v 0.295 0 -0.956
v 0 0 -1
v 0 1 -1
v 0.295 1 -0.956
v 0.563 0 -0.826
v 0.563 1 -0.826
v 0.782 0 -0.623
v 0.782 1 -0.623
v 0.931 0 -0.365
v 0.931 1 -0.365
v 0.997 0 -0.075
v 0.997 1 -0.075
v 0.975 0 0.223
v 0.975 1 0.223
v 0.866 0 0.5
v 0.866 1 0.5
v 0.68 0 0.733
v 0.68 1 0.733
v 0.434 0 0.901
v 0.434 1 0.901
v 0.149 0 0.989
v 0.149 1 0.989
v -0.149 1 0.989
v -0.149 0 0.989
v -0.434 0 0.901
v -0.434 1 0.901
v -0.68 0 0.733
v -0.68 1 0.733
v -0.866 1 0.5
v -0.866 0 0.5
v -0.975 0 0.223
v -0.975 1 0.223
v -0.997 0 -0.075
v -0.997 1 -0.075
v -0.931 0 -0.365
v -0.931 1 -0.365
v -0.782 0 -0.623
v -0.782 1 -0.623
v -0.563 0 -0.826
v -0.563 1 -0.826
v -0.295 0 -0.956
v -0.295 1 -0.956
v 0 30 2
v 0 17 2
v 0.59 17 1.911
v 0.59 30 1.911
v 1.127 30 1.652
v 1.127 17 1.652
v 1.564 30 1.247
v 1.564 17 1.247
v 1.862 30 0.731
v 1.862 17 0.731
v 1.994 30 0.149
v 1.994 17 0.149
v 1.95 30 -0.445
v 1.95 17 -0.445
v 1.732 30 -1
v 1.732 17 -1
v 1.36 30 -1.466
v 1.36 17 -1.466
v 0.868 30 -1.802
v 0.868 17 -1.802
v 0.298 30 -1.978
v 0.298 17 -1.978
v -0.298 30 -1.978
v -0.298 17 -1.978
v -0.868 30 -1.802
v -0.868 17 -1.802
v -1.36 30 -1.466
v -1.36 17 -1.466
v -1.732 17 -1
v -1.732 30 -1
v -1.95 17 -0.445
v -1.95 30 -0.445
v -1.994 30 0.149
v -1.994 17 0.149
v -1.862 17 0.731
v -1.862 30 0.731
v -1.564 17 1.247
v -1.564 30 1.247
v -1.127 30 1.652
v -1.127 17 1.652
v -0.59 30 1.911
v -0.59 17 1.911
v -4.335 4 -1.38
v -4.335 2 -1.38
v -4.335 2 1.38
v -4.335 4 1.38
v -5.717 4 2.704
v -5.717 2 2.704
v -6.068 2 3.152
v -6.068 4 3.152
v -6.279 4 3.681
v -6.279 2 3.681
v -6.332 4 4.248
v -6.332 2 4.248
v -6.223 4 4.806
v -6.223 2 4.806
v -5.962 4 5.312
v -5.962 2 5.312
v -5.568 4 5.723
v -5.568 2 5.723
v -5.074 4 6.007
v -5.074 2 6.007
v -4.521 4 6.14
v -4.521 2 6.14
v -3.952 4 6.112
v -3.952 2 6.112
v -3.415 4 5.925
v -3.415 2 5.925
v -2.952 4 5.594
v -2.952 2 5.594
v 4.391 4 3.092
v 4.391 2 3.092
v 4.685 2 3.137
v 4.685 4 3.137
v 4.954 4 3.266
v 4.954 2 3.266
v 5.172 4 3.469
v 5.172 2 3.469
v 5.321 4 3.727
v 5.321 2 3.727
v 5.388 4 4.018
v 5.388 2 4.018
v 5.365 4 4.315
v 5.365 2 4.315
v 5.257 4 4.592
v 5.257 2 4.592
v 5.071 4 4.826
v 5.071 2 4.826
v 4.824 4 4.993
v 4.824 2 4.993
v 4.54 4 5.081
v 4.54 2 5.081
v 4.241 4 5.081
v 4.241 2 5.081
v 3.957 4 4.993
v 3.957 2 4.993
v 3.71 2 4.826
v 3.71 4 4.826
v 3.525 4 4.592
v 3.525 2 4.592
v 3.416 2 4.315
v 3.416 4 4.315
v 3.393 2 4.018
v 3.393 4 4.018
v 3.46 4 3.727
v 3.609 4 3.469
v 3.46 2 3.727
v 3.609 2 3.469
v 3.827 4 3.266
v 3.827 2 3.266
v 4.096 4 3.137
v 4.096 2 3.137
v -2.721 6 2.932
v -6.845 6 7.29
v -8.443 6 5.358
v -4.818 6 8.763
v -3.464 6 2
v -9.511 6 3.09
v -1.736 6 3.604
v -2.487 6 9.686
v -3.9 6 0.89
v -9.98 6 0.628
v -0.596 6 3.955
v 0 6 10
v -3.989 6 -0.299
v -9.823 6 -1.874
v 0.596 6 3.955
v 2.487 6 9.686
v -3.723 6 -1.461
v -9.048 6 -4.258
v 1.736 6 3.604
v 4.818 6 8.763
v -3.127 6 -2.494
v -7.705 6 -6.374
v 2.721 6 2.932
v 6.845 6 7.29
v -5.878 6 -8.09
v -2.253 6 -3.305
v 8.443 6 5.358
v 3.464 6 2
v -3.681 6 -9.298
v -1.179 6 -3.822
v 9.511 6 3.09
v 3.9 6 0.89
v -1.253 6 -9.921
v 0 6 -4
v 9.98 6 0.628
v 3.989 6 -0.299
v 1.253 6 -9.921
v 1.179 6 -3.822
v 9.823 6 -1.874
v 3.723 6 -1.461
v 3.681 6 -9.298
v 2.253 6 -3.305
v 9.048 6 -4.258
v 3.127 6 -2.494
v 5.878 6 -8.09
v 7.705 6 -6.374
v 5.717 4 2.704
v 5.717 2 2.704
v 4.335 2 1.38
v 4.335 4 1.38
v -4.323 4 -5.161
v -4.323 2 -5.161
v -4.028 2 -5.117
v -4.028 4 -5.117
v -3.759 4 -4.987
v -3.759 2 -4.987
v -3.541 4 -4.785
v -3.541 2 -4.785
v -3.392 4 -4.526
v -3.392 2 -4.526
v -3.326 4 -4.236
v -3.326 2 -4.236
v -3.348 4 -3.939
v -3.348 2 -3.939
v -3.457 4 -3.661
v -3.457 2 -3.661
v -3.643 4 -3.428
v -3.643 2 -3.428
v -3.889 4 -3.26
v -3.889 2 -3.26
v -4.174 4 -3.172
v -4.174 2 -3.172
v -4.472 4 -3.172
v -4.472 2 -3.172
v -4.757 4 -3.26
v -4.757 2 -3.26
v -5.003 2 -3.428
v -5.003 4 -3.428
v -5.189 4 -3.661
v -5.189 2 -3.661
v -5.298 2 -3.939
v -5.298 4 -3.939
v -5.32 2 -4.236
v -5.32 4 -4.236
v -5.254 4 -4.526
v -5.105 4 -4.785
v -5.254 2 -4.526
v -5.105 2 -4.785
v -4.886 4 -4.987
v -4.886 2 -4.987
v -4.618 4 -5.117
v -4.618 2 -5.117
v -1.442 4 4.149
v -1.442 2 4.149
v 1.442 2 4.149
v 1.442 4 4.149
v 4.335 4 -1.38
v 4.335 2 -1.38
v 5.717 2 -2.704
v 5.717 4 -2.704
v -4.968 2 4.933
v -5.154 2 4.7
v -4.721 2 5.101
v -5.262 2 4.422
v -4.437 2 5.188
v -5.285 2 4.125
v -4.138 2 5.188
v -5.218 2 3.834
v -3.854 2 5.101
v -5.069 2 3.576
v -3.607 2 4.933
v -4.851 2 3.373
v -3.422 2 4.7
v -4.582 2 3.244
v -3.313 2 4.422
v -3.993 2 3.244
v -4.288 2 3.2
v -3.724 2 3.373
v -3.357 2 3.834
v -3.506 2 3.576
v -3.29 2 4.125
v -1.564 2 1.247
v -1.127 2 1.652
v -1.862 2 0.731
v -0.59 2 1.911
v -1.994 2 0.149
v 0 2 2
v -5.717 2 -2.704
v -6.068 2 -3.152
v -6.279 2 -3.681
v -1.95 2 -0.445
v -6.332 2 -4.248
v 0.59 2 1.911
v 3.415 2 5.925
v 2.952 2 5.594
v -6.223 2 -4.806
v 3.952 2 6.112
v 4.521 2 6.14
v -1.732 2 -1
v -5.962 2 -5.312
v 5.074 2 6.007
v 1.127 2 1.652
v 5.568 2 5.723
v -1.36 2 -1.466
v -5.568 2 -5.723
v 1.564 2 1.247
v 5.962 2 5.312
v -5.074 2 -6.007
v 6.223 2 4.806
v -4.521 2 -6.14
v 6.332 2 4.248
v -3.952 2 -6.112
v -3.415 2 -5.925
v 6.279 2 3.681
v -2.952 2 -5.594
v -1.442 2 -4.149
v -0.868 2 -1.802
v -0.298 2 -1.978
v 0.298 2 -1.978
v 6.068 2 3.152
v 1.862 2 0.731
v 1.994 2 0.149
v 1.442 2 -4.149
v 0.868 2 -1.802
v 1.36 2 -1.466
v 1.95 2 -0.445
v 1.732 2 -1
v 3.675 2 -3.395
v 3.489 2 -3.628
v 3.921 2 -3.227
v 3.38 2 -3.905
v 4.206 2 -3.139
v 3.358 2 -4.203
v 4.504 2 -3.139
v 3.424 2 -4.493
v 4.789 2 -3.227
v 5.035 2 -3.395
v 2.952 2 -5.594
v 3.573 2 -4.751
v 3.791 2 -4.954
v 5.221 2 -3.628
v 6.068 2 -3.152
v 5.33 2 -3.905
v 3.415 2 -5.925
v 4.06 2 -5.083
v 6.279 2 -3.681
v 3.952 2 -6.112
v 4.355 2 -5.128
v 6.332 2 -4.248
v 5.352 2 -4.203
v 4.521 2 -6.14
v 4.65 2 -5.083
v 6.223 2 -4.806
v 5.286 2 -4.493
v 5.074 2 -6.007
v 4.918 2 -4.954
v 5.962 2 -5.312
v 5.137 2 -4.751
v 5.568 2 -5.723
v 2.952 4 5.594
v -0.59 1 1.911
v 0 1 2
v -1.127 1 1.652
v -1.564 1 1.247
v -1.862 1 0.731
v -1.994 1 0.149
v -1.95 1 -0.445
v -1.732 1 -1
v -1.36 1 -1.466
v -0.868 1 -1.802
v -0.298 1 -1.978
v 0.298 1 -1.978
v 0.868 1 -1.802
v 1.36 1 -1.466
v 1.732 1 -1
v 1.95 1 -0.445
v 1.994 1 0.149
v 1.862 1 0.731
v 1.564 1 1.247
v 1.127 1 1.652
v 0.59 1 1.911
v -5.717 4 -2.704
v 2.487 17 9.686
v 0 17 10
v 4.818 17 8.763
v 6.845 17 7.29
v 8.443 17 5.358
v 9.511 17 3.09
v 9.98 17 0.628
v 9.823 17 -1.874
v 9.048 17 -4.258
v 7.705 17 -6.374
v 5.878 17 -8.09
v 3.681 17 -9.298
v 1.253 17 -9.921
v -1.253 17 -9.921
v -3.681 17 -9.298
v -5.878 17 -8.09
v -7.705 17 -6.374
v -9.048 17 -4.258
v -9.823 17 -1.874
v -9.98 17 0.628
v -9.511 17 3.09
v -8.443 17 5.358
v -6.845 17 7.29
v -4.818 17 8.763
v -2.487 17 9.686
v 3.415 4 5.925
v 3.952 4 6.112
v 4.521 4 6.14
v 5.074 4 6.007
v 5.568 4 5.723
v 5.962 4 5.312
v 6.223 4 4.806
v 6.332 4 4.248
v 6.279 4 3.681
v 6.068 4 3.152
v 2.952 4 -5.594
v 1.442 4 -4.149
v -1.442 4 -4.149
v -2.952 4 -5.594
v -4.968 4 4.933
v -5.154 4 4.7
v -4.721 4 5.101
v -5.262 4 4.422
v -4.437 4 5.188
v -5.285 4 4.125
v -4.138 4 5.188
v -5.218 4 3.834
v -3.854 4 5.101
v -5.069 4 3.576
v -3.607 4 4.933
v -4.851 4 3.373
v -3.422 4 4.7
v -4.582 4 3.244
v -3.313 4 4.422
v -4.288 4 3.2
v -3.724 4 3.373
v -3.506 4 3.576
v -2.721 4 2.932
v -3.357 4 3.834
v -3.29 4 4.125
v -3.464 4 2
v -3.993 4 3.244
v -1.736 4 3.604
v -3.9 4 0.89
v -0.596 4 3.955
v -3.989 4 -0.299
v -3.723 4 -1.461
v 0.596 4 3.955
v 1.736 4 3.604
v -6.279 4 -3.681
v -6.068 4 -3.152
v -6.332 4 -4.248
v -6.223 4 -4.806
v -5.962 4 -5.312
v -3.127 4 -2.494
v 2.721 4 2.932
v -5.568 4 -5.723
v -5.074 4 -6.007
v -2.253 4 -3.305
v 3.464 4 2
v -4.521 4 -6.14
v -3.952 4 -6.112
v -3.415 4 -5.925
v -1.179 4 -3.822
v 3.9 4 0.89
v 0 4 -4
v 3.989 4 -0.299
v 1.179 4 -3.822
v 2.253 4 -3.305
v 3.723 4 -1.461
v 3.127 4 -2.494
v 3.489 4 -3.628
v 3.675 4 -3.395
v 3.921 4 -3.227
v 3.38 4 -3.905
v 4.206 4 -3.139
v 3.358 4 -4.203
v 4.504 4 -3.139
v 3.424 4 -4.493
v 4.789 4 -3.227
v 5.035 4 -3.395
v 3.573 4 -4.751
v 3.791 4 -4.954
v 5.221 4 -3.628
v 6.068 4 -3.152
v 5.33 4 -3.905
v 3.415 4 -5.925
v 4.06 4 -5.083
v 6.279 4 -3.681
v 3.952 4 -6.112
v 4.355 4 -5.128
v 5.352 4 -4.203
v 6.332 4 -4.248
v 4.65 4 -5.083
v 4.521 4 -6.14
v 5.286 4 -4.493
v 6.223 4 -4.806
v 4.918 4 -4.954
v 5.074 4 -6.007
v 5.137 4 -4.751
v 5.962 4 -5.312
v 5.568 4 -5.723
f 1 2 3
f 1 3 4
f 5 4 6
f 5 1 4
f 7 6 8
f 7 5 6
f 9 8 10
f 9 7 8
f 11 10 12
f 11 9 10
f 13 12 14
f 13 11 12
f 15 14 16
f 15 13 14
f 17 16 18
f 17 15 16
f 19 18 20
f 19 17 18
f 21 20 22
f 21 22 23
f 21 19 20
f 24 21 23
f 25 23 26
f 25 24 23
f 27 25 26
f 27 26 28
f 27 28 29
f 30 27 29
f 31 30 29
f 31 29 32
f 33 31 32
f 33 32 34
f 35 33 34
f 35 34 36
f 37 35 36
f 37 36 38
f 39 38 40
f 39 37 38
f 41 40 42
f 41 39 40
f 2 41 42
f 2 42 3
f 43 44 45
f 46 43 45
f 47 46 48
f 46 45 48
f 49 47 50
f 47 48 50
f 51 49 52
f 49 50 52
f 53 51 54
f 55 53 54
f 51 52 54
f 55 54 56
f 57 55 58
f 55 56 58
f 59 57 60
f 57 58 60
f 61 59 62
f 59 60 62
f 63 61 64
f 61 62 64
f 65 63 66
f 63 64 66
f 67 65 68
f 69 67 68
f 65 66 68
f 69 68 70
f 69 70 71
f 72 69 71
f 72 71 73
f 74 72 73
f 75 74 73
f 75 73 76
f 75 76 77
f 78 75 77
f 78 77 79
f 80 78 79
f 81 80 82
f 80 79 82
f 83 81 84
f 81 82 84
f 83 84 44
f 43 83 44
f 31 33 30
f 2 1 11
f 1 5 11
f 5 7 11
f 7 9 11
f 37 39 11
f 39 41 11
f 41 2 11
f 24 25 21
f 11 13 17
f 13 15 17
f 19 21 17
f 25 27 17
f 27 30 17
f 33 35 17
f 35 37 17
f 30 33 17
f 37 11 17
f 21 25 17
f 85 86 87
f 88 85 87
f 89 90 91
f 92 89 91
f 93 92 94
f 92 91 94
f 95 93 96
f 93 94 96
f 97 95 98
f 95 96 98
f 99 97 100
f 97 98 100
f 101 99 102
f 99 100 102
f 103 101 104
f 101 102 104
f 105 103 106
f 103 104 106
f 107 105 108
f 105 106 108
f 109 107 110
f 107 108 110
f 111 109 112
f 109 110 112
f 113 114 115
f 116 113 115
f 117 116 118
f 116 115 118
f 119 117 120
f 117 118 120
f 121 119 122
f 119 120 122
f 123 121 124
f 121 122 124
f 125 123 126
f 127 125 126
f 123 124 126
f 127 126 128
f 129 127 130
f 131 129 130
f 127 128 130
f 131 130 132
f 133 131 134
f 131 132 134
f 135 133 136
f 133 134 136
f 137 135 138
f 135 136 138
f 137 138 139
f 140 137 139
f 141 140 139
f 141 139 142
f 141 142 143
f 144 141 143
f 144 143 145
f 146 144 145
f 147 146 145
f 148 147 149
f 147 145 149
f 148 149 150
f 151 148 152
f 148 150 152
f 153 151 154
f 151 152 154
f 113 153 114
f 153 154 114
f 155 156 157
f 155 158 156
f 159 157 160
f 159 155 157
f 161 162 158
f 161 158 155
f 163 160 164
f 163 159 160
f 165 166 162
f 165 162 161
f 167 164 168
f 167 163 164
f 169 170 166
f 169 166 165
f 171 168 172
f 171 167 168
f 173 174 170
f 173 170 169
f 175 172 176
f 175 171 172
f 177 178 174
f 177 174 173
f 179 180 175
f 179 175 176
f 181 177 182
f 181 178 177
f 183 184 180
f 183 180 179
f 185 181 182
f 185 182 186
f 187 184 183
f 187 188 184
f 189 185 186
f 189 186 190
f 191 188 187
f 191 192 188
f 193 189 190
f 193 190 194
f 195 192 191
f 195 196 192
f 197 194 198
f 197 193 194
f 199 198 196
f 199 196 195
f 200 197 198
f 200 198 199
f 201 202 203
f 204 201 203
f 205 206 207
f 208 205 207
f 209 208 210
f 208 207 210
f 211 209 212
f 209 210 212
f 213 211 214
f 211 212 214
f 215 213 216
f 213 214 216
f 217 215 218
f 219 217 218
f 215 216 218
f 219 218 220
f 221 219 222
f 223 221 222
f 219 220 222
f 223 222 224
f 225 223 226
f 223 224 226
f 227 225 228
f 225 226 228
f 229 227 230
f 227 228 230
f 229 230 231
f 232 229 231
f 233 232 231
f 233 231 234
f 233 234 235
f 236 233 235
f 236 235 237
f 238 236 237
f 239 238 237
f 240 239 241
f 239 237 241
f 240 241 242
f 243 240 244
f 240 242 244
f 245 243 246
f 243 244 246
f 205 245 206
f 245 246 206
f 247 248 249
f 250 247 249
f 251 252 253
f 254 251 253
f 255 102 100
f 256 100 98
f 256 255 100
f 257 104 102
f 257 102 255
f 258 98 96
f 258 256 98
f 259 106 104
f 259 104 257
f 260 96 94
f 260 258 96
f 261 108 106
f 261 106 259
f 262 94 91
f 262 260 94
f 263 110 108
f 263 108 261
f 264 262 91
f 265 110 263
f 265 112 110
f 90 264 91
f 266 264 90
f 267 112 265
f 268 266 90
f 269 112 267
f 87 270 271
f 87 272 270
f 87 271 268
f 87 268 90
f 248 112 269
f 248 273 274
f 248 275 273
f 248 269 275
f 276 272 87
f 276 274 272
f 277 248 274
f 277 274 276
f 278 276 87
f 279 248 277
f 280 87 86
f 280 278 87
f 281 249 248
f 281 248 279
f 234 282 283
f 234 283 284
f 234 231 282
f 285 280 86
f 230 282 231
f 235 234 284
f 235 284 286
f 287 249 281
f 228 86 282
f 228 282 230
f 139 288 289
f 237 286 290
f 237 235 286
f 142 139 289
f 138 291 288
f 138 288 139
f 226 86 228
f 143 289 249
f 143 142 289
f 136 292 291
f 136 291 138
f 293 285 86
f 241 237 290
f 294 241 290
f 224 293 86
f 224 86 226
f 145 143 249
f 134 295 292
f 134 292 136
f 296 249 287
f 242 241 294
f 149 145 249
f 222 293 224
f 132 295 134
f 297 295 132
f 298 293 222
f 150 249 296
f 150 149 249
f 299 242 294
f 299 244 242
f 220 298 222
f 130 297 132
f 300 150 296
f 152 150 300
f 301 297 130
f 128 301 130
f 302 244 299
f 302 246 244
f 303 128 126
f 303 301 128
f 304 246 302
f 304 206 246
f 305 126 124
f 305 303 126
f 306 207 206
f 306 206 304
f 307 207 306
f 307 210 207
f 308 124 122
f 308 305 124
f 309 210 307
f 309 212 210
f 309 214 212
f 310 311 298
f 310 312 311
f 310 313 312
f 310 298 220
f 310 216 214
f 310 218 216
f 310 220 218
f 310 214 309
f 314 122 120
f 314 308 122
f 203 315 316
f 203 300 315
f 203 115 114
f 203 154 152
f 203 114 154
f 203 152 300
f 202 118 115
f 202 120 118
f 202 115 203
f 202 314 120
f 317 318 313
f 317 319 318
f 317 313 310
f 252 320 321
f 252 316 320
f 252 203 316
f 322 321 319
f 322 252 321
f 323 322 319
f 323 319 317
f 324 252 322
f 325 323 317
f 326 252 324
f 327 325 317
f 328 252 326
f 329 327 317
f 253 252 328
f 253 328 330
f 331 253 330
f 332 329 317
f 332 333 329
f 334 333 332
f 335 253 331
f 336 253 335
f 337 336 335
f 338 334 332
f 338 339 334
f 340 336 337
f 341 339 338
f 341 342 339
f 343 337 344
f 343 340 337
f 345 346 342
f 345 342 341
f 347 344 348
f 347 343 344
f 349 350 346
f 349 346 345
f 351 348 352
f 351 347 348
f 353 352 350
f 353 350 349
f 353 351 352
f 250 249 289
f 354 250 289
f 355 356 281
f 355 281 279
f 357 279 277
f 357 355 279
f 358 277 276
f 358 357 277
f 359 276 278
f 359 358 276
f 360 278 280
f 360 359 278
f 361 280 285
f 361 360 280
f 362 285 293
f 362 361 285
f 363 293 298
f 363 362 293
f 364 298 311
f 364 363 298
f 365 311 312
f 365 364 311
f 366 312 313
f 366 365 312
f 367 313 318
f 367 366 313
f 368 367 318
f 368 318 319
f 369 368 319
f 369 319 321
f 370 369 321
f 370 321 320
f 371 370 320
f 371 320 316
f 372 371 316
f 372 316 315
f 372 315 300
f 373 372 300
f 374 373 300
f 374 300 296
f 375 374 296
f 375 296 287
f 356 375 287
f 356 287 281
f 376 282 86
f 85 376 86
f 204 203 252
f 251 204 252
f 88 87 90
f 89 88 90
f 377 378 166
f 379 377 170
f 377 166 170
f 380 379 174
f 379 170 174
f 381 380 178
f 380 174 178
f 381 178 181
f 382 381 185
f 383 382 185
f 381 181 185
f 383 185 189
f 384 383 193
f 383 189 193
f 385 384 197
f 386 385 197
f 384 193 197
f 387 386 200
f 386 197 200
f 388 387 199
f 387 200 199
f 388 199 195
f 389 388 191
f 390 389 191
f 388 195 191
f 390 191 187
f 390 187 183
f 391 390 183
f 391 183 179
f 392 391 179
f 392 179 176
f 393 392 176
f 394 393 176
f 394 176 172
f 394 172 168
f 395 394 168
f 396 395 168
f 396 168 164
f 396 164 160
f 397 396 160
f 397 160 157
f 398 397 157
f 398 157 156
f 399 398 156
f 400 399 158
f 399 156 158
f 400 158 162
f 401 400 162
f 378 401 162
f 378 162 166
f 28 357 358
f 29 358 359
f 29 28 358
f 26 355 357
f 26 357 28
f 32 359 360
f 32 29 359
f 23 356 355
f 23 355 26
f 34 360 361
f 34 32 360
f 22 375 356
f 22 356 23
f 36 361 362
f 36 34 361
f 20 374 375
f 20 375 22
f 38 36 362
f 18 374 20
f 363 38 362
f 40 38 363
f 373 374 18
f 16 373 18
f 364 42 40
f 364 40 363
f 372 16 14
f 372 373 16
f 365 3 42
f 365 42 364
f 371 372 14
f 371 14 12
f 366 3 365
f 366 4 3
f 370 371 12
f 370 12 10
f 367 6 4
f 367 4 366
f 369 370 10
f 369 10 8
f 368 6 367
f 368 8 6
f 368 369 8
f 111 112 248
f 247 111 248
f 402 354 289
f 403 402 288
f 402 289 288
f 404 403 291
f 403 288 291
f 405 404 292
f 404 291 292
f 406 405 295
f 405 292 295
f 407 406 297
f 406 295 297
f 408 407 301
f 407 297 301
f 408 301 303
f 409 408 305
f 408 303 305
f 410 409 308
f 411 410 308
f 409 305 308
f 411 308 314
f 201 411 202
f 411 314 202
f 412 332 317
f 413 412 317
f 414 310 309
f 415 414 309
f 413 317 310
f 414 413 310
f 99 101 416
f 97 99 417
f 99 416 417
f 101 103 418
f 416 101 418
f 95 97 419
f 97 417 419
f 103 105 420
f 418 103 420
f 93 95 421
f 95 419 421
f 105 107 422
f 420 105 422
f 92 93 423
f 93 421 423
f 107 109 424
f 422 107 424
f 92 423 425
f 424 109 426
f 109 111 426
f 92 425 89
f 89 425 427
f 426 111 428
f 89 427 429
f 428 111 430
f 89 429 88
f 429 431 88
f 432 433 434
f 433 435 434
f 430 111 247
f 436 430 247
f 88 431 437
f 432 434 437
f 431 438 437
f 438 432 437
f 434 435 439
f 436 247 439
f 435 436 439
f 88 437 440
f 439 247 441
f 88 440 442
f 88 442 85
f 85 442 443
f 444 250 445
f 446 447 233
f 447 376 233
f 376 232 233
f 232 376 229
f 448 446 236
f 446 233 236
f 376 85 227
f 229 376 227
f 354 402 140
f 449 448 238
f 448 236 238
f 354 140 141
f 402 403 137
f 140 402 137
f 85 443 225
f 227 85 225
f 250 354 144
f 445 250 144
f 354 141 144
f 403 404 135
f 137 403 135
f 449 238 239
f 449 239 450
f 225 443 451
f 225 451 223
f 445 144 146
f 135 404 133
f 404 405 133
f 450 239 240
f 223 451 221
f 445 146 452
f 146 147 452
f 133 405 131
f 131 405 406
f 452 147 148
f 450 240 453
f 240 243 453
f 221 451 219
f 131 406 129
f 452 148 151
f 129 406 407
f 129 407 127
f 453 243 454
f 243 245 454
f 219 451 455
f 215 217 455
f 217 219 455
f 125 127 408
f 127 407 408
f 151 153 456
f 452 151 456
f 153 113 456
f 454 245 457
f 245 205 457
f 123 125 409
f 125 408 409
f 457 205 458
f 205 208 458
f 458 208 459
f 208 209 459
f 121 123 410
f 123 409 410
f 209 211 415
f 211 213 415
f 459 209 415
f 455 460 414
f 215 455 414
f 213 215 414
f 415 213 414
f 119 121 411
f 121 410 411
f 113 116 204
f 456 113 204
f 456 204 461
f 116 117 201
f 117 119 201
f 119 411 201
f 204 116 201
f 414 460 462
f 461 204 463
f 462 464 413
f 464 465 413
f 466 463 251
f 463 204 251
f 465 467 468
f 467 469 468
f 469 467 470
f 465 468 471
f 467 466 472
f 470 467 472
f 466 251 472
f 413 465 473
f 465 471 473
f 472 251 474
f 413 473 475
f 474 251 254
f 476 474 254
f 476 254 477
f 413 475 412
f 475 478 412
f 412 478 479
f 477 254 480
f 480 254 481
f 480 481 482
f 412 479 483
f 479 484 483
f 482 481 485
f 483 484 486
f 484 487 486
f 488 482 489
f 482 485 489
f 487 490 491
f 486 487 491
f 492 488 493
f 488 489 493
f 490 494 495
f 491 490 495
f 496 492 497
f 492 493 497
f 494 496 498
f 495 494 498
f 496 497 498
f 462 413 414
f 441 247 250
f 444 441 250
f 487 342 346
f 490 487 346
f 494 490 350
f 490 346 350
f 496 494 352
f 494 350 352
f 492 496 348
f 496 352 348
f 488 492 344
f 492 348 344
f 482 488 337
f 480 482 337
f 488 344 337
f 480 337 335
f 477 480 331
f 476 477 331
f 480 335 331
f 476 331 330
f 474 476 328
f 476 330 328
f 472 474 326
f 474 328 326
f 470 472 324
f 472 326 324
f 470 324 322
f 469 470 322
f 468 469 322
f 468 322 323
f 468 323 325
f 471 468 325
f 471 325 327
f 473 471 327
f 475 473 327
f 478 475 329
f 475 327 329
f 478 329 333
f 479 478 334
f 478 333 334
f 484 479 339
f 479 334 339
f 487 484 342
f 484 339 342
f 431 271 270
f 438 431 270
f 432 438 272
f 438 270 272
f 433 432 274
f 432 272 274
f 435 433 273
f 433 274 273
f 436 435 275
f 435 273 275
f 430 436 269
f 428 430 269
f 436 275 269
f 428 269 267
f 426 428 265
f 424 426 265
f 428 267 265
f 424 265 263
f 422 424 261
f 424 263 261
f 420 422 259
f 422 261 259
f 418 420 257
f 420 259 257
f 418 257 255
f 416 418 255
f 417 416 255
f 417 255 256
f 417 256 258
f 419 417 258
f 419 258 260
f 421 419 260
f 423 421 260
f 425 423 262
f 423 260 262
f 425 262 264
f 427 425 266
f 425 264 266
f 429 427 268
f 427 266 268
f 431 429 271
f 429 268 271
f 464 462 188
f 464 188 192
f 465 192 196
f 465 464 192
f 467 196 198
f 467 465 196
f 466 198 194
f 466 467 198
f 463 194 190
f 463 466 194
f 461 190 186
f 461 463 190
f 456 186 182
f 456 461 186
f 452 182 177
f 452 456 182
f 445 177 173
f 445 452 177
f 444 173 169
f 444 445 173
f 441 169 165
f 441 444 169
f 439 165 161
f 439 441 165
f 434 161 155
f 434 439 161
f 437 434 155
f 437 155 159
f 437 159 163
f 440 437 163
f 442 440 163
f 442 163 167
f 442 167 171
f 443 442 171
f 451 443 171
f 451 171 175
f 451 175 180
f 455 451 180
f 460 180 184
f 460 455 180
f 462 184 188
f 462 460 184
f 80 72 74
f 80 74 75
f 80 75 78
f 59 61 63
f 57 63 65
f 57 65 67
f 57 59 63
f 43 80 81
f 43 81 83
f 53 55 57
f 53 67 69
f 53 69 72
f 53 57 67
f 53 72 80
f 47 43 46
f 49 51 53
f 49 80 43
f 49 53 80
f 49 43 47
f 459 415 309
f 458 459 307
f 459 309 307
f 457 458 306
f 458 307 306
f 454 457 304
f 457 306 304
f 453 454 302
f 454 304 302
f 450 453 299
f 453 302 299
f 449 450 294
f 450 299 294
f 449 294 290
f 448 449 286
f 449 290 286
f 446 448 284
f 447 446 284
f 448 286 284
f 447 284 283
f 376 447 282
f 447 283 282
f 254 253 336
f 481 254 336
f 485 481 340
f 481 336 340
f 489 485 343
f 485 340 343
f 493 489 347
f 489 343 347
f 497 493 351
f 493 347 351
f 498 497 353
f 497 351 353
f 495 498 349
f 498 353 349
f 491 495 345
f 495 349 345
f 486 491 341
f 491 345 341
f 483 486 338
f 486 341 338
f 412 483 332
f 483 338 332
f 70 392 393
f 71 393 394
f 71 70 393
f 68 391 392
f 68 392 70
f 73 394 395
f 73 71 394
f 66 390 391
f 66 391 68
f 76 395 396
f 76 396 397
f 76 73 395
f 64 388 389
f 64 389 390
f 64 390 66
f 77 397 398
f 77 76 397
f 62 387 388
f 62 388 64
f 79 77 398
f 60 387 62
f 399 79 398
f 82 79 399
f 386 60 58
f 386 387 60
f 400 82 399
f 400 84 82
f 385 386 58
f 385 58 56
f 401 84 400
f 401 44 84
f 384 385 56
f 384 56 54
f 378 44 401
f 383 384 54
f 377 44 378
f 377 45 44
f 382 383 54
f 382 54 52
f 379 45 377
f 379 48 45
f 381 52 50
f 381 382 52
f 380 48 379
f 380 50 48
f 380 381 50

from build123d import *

# Parameters (mm, degrees)
SKETCH2_R           = 10
BOSS_EXTRUDE2_DEPTH = 30
CUT_EXTRUDE5_START  = -13
SKETCH8_R           = 10
SKETCH8_R_2         = 4
CUT_EXTRUDE5_DEPTH  = 13
CUT_EXTRUDE6_START  = -13
SKETCH9_R           = 4
SKETCH9_R_2         = 2
CUT_EXTRUDE6_DEPTH  = 13
SKETCH10_R          = 10
SKETCH10_R_2        = 1
CUT_EXTRUDE7_DEPTH  = 1
SKETCH11_R          = 10
SKETCH11_R_2        = 2
CUT_EXTRUDE8_DEPTH  = 2
SKETCH12_R          = 10
CUT_EXTRUDE9_DEPTH  = 4
SKETCH13_R          = 10
SKETCH13_R_2        = 4
CUT_EXTRUDE10_DEPTH = 2
SKETCH14_R          = 1
CUT_EXTRUDE11_DEPTH = 2


with BuildPart() as part:
    # Sketch2 → Boss-Extrude2 (new body)
    with BuildSketch(Plane(origin=(0, 0, 0), x_dir=(1, 0, 0), z_dir=(0, 1, 0))):
        with Locations(Location((0, 0, 0), (0, 0, 270))):
            Circle(SKETCH2_R)
    extrude(amount=BOSS_EXTRUDE2_DEPTH)

    # Sketch8 → Cut-Extrude5 (cut)
    with BuildSketch(Plane(origin=(0, 30, 0), x_dir=(1, 0, 0), z_dir=(0, 1, 0)).offset(CUT_EXTRUDE5_START)):
        with Locations(Location((0, 0, 0), (0, 0, 270))):
            Circle(SKETCH8_R)
        with Locations(Location((0, 0, 0), (0, 0, 270))):
            Circle(SKETCH8_R_2, mode=Mode.SUBTRACT)
    extrude(amount=CUT_EXTRUDE5_DEPTH, mode=Mode.SUBTRACT)

    # Sketch9 → Cut-Extrude6 (cut)
    with BuildSketch(Plane(origin=(0, 30, 0), x_dir=(1, 0, 0), z_dir=(0, 1, 0)).offset(CUT_EXTRUDE6_START)):
        Circle(SKETCH9_R)
        with Locations(Location((0, 0, 0), (0, 0, 270))):
            Circle(SKETCH9_R_2, mode=Mode.SUBTRACT)
    extrude(amount=CUT_EXTRUDE6_DEPTH, mode=Mode.SUBTRACT)

    # Sketch10 → Cut-Extrude7 (cut)
    with BuildSketch(Plane.XZ):
        with Locations(Location((0, 0, 0), (0, 0, 270))):
            Circle(SKETCH10_R)
        with Locations(Location((0, 0, 0), (0, 0, 270))):
            Circle(SKETCH10_R_2, mode=Mode.SUBTRACT)
    extrude(amount=-CUT_EXTRUDE7_DEPTH, mode=Mode.SUBTRACT)

    # Sketch11 → Cut-Extrude8 (cut)
    with BuildSketch(Plane(origin=(0, 0, 0), x_dir=(-1, 0, 0), z_dir=(0, -1, 0))):
        with Locations(Location((0, 0, 0), (0, 0, 90))):
            Circle(SKETCH11_R)
        with Locations(Location((0, 0, 0), (0, 0, 270))):
            Circle(SKETCH11_R_2, mode=Mode.SUBTRACT)
    extrude(amount=-CUT_EXTRUDE8_DEPTH, mode=Mode.SUBTRACT)

    # Sketch12 → Cut-Extrude9 (cut)
    with BuildSketch(Plane(origin=(0, 0, 0), x_dir=(-1, 0, 0), z_dir=(0, -1, 0))):
        with Locations(Location((0, 0, 0), (0, 0, 90))):
            Circle(SKETCH12_R)
        with BuildLine():
            Line((1.442076294, -4.148689545), (-1.442076294, -4.148689545))
            Line((-1.442076294, -4.148689545), (-2.95165941, -5.593541519))
            ThreePointArc((-2.95165941, -5.593541519), (-5.779407899, -5.53158606), (-5.717452439, -2.70383757))
            Line((-5.717452439, -2.70383757), (-4.334555924, -1.380239856))
            Line((-4.334555924, -1.380239856), (-4.334555924, 1.380239856))
            Line((-4.334555924, 1.380239856), (-5.717452439, 2.70383757))
            ThreePointArc((-5.717452439, 2.70383757), (-5.779407899, 5.53158606), (-2.95165941, 5.593541519))
            Line((-2.95165941, 5.593541519), (-1.442076294, 4.148689545))
            Line((-1.442076294, 4.148689545), (1.442076294, 4.148689545))
            Line((1.442076294, 4.148689545), (2.95165941, 5.593541519))
            ThreePointArc((2.95165941, 5.593541519), (5.779407899, 5.53158606), (5.717452439, 2.70383757))
            Line((5.717452439, 2.70383757), (4.334555924, 1.380239856))
            Line((4.334555924, 1.380239856), (4.334555924, -1.380239856))
            Line((4.334555924, -1.380239856), (5.717452439, -2.70383757))
            ThreePointArc((5.717452439, -2.70383757), (5.779407899, -5.53158606), (2.95165941, -5.593541519))
            Line((2.95165941, -5.593541519), (1.442076294, -4.148689545))
        make_face(mode=Mode.SUBTRACT)
    extrude(amount=-CUT_EXTRUDE9_DEPTH, mode=Mode.SUBTRACT)

    # Sketch13 → Cut-Extrude10 (cut)
    with BuildSketch(Plane.XZ.offset(-4)):
        with Locations(Location((0, 0, 0), (0, 0, 270))):
            Circle(SKETCH13_R)
        with Locations(Location((0, 0, 0), (0, 0, 270))):
            Circle(SKETCH13_R_2, mode=Mode.SUBTRACT)
    extrude(amount=-CUT_EXTRUDE10_DEPTH, mode=Mode.SUBTRACT)

    # Sketch14 → Cut-Extrude11 (cut)
    with BuildSketch(Plane.XZ.offset(-2)):
        with Locations(Location((-4.287533824, 4.199553123, 0), (0, 0, 270))):
            Circle(SKETCH14_R)
        with Locations(Location((4.390527215, 4.092485492, 0), (0, 0, 270))):
            Circle(SKETCH14_R)
        with Locations(Location((4.354750155, -4.127894387, 0), (0, 0, 270))):
            Circle(SKETCH14_R)
        with Locations(Location((-4.322800784, -4.16107677, 0), (0, 0, 270))):
            Circle(SKETCH14_R)
    extrude(amount=-CUT_EXTRUDE11_DEPTH, mode=Mode.SUBTRACT)


solid = part.part
